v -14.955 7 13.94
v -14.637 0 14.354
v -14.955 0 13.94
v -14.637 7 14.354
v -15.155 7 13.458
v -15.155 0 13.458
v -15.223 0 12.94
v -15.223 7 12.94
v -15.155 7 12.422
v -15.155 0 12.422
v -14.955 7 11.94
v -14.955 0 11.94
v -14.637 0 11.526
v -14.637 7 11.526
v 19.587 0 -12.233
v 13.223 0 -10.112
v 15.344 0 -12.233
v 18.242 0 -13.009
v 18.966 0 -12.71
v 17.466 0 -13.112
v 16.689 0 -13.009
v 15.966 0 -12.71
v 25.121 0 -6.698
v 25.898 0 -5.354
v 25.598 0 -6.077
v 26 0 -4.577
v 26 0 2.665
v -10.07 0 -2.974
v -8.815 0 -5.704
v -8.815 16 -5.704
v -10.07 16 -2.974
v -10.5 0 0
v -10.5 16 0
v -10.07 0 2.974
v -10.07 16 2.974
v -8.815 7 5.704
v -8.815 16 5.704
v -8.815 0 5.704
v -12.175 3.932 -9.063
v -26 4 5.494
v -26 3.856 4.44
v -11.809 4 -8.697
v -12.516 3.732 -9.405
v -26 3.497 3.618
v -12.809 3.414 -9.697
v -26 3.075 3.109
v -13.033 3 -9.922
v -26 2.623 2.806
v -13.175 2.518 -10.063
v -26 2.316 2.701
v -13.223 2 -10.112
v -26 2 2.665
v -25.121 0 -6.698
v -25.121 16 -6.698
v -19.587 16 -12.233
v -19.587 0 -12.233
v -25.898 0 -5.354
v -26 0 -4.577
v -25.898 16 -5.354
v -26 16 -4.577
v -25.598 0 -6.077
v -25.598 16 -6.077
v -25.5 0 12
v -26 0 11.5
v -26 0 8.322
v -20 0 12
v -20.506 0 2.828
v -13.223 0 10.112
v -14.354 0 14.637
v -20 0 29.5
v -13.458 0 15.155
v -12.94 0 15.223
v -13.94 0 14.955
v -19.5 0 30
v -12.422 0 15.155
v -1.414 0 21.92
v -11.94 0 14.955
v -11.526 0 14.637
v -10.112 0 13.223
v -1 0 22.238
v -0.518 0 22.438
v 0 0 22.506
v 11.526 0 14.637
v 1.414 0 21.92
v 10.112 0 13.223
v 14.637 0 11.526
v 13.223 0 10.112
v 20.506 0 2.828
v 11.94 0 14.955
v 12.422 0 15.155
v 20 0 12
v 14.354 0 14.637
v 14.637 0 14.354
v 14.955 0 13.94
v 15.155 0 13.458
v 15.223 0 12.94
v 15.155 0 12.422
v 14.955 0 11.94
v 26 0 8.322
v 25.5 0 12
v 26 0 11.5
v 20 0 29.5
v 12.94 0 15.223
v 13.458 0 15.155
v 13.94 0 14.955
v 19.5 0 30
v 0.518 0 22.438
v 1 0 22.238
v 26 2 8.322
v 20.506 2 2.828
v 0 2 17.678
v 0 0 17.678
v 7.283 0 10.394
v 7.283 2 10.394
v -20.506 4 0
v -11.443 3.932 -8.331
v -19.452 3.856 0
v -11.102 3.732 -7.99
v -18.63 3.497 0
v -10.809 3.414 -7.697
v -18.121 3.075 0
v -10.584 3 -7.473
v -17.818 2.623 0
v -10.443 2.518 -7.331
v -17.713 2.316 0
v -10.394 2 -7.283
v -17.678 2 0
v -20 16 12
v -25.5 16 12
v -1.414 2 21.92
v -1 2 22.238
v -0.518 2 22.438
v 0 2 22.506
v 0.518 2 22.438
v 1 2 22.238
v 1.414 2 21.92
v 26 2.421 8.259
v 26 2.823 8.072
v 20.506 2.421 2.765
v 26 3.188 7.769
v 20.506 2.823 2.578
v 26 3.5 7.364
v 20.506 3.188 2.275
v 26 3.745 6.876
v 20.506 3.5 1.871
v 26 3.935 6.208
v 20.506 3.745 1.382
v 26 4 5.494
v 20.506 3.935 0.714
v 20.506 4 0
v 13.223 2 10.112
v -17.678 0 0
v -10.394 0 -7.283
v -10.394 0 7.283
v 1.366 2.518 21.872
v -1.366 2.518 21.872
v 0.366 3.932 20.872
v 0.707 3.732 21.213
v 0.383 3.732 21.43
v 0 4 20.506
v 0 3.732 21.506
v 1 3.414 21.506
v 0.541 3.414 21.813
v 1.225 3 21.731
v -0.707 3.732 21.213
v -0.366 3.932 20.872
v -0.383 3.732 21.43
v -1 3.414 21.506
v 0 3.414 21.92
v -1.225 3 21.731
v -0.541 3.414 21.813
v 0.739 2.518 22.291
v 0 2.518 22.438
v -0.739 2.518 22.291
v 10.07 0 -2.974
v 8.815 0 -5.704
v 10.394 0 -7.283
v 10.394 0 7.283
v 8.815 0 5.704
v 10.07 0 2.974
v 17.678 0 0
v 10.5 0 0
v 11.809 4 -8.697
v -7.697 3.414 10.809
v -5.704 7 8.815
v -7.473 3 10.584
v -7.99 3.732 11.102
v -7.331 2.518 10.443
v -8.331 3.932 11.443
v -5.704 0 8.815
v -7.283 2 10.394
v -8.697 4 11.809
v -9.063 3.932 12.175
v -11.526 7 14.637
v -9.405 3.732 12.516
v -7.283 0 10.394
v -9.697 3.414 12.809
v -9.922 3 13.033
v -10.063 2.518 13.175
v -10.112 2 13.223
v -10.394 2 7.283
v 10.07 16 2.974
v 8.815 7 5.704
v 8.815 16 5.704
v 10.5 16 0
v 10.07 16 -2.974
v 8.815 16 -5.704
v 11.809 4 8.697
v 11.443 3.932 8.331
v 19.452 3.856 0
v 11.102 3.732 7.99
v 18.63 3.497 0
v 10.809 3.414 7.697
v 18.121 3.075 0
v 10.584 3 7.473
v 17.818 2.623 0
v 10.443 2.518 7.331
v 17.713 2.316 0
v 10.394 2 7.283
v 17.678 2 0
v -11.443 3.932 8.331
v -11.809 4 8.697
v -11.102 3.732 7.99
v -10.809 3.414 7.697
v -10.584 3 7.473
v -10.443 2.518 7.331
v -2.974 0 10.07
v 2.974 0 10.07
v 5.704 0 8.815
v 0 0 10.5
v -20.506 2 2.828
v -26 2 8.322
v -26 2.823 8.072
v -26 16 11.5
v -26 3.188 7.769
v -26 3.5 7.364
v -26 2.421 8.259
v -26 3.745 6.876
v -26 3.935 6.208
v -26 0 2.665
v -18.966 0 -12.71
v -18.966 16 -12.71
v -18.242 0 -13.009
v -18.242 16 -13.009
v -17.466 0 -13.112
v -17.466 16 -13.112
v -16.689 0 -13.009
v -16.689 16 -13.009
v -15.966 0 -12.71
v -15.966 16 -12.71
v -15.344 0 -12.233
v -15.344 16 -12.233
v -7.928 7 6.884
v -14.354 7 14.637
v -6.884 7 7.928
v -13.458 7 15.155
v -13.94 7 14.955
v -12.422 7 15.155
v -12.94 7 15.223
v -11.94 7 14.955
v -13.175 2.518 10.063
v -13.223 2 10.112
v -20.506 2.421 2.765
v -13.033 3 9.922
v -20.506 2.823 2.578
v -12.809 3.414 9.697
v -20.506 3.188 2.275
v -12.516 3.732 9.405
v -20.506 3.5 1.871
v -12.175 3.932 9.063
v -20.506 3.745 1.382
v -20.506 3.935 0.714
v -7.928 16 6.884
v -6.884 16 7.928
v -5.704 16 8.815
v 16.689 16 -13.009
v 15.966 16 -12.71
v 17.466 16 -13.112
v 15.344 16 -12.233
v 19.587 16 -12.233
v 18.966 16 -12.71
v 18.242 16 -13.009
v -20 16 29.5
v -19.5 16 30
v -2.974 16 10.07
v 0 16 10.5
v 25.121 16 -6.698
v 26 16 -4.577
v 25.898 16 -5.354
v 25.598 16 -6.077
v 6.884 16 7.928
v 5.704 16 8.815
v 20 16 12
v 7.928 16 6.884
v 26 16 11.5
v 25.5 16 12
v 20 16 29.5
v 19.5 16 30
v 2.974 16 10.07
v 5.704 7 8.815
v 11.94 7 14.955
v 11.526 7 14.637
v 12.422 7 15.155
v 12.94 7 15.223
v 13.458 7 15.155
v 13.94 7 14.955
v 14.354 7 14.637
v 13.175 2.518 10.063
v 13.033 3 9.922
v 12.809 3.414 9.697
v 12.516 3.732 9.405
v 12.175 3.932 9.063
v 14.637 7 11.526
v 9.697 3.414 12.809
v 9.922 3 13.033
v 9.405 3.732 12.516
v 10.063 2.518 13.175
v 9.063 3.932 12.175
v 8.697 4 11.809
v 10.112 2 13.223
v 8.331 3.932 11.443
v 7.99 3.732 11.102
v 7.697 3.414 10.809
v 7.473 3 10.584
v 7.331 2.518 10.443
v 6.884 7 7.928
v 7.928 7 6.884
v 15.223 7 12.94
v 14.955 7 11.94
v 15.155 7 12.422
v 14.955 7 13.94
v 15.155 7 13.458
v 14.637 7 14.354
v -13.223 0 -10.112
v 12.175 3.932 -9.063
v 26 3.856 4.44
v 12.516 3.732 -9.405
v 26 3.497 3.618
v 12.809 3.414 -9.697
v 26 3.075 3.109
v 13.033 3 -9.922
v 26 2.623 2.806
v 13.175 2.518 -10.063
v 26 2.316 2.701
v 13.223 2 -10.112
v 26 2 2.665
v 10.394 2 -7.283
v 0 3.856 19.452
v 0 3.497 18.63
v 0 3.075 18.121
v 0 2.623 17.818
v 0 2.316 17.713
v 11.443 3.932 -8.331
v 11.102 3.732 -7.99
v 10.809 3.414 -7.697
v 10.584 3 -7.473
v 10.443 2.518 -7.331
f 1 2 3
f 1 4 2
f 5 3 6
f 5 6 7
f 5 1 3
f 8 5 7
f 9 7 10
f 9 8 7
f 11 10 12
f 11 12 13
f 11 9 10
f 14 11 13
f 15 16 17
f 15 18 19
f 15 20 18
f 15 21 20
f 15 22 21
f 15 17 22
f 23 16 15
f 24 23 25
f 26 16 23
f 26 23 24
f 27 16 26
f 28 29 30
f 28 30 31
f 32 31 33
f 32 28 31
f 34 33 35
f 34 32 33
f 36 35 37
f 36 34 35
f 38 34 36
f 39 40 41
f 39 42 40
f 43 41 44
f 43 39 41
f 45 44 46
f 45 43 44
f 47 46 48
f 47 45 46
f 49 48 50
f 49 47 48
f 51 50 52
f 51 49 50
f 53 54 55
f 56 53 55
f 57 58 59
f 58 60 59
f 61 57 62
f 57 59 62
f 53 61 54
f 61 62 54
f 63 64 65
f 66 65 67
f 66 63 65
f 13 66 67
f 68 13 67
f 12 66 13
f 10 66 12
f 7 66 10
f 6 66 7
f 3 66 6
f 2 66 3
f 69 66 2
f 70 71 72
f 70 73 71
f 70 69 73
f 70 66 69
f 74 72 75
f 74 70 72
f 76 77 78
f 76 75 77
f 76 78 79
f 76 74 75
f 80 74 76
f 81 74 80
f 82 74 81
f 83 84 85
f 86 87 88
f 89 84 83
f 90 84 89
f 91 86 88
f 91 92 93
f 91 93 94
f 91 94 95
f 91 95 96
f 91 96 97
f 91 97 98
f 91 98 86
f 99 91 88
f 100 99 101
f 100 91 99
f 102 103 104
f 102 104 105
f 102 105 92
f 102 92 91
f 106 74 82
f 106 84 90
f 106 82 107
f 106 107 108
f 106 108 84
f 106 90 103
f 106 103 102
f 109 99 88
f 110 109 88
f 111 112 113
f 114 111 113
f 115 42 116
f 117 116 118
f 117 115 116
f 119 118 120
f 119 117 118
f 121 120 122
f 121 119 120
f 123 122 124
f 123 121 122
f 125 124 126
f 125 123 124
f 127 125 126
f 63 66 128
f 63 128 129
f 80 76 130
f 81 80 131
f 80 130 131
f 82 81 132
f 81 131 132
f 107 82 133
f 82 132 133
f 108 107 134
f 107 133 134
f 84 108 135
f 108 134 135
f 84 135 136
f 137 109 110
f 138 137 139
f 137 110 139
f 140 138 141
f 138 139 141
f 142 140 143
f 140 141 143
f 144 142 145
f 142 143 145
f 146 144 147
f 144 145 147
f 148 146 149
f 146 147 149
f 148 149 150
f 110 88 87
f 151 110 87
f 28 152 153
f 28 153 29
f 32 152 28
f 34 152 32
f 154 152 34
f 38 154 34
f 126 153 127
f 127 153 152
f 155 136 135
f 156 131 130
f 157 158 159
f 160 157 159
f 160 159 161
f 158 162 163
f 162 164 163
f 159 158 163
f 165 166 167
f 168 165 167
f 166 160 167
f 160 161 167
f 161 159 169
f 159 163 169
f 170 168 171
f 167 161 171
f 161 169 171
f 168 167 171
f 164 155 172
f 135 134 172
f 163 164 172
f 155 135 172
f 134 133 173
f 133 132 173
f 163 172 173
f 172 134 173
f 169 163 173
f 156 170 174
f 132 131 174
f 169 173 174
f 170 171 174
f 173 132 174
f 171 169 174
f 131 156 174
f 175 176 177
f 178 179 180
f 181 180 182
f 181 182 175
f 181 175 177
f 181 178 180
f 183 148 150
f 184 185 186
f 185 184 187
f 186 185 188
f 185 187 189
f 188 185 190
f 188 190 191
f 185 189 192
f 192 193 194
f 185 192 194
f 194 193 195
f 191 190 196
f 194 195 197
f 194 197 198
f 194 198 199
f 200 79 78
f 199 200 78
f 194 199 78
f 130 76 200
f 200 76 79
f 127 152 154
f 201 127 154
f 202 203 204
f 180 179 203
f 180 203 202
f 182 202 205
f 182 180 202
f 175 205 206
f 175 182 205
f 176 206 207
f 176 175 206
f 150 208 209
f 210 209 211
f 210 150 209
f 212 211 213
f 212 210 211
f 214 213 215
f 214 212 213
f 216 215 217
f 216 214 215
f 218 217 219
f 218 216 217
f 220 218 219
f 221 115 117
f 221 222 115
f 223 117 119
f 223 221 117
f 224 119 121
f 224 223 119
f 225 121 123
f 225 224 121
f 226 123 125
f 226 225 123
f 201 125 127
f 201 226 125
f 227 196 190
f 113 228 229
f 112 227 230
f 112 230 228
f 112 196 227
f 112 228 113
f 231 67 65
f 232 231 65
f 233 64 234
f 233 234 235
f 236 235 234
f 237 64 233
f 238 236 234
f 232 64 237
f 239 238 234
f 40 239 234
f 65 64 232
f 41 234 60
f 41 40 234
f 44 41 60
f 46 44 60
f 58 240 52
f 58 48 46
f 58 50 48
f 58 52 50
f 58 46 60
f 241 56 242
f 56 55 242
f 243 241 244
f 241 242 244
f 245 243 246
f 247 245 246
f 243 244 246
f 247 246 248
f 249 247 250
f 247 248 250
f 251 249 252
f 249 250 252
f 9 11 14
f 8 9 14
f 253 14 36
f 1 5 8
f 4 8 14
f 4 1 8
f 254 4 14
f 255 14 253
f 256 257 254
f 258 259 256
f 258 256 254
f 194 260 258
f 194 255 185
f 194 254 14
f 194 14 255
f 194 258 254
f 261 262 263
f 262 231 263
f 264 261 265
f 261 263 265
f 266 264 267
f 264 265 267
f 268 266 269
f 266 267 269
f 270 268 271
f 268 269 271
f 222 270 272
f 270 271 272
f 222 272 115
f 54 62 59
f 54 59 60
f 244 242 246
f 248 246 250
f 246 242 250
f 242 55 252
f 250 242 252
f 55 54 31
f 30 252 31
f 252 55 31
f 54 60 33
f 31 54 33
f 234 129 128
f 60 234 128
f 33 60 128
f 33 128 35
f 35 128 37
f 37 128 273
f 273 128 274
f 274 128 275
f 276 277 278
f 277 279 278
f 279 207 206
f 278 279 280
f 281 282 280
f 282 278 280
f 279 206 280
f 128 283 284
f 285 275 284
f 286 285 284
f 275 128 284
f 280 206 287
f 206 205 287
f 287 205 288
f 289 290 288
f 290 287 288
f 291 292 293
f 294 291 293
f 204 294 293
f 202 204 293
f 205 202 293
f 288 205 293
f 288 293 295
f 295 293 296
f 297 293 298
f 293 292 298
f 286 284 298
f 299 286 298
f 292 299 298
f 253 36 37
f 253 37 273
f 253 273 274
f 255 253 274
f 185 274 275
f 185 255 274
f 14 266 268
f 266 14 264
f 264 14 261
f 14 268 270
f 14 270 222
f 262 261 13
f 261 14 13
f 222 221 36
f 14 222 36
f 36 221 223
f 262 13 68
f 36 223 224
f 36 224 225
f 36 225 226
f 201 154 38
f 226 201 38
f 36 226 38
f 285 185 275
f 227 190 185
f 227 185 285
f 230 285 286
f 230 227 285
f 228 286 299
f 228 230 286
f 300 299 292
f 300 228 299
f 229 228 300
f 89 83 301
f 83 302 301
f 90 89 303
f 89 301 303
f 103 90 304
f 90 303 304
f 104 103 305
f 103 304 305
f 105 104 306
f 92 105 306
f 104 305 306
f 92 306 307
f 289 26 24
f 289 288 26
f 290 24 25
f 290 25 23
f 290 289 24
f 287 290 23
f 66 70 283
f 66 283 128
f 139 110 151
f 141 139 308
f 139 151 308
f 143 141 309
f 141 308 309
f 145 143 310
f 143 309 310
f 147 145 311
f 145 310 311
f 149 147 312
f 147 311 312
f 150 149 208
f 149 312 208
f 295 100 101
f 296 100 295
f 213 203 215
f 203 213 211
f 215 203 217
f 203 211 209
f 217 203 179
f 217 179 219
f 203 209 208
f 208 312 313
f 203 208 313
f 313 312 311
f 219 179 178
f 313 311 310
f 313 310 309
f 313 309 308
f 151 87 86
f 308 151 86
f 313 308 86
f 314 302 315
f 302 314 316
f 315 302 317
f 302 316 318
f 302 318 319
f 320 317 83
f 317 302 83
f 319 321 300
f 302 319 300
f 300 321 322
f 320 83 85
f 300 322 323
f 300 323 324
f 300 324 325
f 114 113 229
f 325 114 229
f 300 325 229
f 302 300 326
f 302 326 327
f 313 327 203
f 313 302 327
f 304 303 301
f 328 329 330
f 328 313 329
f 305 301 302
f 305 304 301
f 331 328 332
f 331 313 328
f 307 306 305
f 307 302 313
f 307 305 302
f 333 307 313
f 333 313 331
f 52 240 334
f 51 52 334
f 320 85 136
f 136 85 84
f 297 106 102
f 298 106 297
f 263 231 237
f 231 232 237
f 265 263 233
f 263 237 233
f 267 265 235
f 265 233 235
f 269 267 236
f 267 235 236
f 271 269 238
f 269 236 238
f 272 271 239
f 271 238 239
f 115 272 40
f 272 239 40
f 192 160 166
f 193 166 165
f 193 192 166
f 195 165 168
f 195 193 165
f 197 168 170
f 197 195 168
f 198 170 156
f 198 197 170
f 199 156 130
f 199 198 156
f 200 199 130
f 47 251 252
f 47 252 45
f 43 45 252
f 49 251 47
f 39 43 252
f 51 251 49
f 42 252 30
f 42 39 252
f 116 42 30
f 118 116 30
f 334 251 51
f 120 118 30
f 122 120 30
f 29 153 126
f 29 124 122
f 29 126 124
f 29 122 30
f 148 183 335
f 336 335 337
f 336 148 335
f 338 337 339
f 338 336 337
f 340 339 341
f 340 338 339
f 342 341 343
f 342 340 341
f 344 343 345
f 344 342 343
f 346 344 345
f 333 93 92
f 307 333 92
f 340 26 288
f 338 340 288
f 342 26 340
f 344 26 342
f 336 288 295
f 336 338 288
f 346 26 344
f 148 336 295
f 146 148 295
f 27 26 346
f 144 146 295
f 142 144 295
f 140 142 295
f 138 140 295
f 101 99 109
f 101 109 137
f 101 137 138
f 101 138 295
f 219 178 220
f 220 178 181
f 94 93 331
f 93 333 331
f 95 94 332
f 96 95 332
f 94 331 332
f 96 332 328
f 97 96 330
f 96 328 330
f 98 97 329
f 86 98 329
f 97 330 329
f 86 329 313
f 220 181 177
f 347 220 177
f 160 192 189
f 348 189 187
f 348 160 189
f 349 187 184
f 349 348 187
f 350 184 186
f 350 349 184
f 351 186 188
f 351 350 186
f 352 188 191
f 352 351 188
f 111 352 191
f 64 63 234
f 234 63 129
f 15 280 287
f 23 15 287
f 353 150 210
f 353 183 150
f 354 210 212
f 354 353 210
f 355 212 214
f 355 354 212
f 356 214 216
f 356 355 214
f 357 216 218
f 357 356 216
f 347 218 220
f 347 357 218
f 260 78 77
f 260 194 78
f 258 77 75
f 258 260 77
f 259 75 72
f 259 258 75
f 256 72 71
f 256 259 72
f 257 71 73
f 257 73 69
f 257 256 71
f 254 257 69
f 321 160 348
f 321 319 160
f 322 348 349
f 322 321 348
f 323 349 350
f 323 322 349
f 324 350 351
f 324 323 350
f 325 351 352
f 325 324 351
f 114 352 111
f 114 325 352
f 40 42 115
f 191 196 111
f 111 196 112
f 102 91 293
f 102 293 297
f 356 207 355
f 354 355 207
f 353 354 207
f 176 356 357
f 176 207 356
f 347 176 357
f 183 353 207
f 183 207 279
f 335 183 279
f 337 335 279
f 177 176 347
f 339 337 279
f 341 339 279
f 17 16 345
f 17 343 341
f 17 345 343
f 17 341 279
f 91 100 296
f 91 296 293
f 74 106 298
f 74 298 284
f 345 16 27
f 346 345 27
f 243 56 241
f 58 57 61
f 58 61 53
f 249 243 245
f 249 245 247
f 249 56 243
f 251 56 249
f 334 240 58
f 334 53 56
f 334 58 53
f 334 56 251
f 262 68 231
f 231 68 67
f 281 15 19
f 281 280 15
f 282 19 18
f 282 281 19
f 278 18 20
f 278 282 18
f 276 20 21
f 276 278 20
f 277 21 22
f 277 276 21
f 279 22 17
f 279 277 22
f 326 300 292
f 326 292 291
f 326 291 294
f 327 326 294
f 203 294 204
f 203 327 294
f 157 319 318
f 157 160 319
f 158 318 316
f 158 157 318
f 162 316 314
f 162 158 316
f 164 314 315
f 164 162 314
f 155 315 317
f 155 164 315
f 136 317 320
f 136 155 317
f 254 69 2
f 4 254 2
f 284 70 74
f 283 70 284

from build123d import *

# Parameters (mm, degrees)
F1_DEPTH = 16
F2_DEPTH = 7
F3_DEPTH = 4
F4_R     = 2
F5_R     = 1.9999
F6_R     = 3
F7_SIZE  = 0.5


# Not quite as in the source:
# - a fillet or chamfer is up to 0.001 mm smaller than in the source, because OpenCascade refuses the exact size
# - a feature names something its author has since deleted; it is built from what else it names


with BuildPart() as f1:
    # F0 (on Front) → F1 (new body)
    with BuildSketch(Plane.XZ):
        with BuildLine():
            ThreePointArc((-5.7041860158, 8.815455853), (0, 10.5), (5.7041860158, 8.815455853))
            Line((5.7041860158, 8.815455853), (7.2831998462, 10.3944696834))
            Line((7.2831998462, 10.3944696834), (0, 17.6776695297))
            Line((0, 17.6776695297), (-7.2831998462, 10.3944696834))
            Line((-7.2831998462, 10.3944696834), (-5.7041860158, 8.815455853))
        make_face()
        with BuildLine():
            ThreePointArc((-8.815455853, 5.7041860158), (-7.4246212025, 7.4246212025), (-5.7041860158, 8.815455853))
            Line((-5.7041860158, 8.815455853), (-7.2831998462, 10.3944696834))
            Line((-7.2831998462, 10.3944696834), (-10.3944696834, 7.2831998462))
            Line((-10.3944696834, 7.2831998462), (-8.815455853, 5.7041860158))
        make_face()
        with BuildLine():
            ThreePointArc((-8.815455853, -5.7041860158), (-10.5, 0), (-8.815455853, 5.7041860158))
            Line((-8.815455853, 5.7041860158), (-10.3944696834, 7.2831998462))
            Line((-10.3944696834, 7.2831998462), (-17.6776695297, 0))
            Line((-17.6776695297, 0), (-10.3944696834, -7.2831998462))
            Line((-10.3944696834, -7.2831998462), (-8.815455853, -5.7041860158))
        make_face()
        with BuildLine():
            ThreePointArc((5.7041860158, 8.815455853), (7.4246212025, 7.4246212025), (8.815455853, 5.7041860158))
            Line((8.815455853, 5.7041860158), (10.3944696834, 7.2831998462))
            Line((10.3944696834, 7.2831998462), (7.2831998462, 10.3944696834))
            Line((7.2831998462, 10.3944696834), (5.7041860158, 8.815455853))
        make_face()
        Polygon((0, 17.6776695297), (7.2831998462, 10.3944696834), (10.111626971, 13.2228968082), (0, 23.3345237792), (-10.111626971, 13.2228968082), (-7.2831998462, 10.3944696834), align=None)
        Polygon((7.2831998462, 10.3944696834), (10.3944696834, 7.2831998462), (13.2228968082, 10.111626971), (10.111626971, 13.2228968082), align=None)
        Polygon((-10.3944696834, 7.2831998462), (-7.2831998462, 10.3944696834), (-10.111626971, 13.2228968082), (-13.2228968082, 10.111626971), align=None)
        Polygon((-17.6776695297, 0), (-10.3944696834, 7.2831998462), (-13.2228968082, 10.111626971), (-20.5060966544, 2.8284271247), (-26, 8.3223304703), (-26, 2.6654762208), (-13.2228968082, -10.111626971), (-10.3944696834, -7.2831998462), align=None)
        Polygon((-13.2228968082, 10.111626971), (-10.111626971, 13.2228968082), (-12.9400540957, 16.0513239329), (-16.0513239329, 12.9400540957), align=None)
        Polygon((17.6776695297, 0), (10.3944696834, -7.2831998462), (13.2228968082, -10.111626971), (26, 2.6654762208), (26, 8.3223304703), (20.5060966544, 2.8284271247), (13.2228968082, 10.111626971), (10.3944696834, 7.2831998462), align=None)
        with BuildLine():
            ThreePointArc((8.815455853, 5.7041860158), (10.5, 0), (8.815455853, -5.7041860158))
            Line((8.815455853, -5.7041860158), (10.3944696834, -7.2831998462))
            Line((10.3944696834, -7.2831998462), (17.6776695297, 0))
            Line((17.6776695297, 0), (10.3944696834, 7.2831998462))
            Line((10.3944696834, 7.2831998462), (8.815455853, 5.7041860158))
        make_face()
        Polygon((16.0513239329, 12.9400540957), (13.2228968082, 10.111626971), (20.5060966544, 2.8284271247), (26, 8.3223304703), (26, 12), (20, 12), (20, 30), (0, 30), (-20, 30), (-20, 12), (-26, 12), (-26, 8.3223304703), (-20.5060966544, 2.8284271247), (-13.2228968082, 10.111626971), (-16.0513239329, 12.9400540957), (-12.9400540957, 16.0513239329), (-10.111626971, 13.2228968082), (0, 23.3345237792), (10.111626971, 13.2228968082), (12.9400540957, 16.0513239329), align=None)
        Polygon((10.111626971, 13.2228968082), (13.2228968082, 10.111626971), (16.0513239329, 12.9400540957), (12.9400540957, 16.0513239329), align=None)
        Polygon((26, 2.6654762208), (13.2228968082, -10.111626971), (17.4655374953, -14.3542676581), (26, -5.8198051534), align=None)
        Polygon((-17.4655374953, -14.3542676581), (-13.2228968082, -10.111626971), (-26, 2.6654762208), (-26, -5.8198051534), align=None)
    extrude(amount=-F1_DEPTH)

    # F0 (on Front) → F2 (cut)
    with BuildSketch(Plane.XZ):
        Polygon((10.111626971, 13.2228968082), (13.2228968082, 10.111626971), (16.0513239329, 12.9400540957), (12.9400540957, 16.0513239329), align=None)
        Polygon((7.2831998462, 10.3944696834), (10.3944696834, 7.2831998462), (13.2228968082, 10.111626971), (10.111626971, 13.2228968082), align=None)
        with BuildLine():
            ThreePointArc((5.7041860158, 8.815455853), (7.4246212025, 7.4246212025), (8.815455853, 5.7041860158))
            Line((8.815455853, 5.7041860158), (10.3944696834, 7.2831998462))
            Line((10.3944696834, 7.2831998462), (7.2831998462, 10.3944696834))
            Line((7.2831998462, 10.3944696834), (5.7041860158, 8.815455853))
        make_face()
        with BuildLine():
            ThreePointArc((-8.815455853, 5.7041860158), (-7.4246212025, 7.4246212025), (-5.7041860158, 8.815455853))
            Line((-5.7041860158, 8.815455853), (-7.2831998462, 10.3944696834))
            Line((-7.2831998462, 10.3944696834), (-10.3944696834, 7.2831998462))
            Line((-10.3944696834, 7.2831998462), (-8.815455853, 5.7041860158))
        make_face()
        Polygon((-13.2228968082, 10.111626971), (-10.111626971, 13.2228968082), (-12.9400540957, 16.0513239329), (-16.0513239329, 12.9400540957), align=None)
        Polygon((-10.3944696834, 7.2831998462), (-7.2831998462, 10.3944696834), (-10.111626971, 13.2228968082), (-13.2228968082, 10.111626971), align=None)
    extrude(amount=-F2_DEPTH, mode=Mode.SUBTRACT)

    # F0 (on Front) → F3 (cut)
    with BuildSketch(Plane.XZ):
        Polygon((0, 17.6776695297), (7.2831998462, 10.3944696834), (10.111626971, 13.2228968082), (0, 23.3345237792), (-10.111626971, 13.2228968082), (-7.2831998462, 10.3944696834), align=None)
        Polygon((17.6776695297, 0), (10.3944696834, -7.2831998462), (13.2228968082, -10.111626971), (26, 2.6654762208), (26, 8.3223304703), (20.5060966544, 2.8284271247), (13.2228968082, 10.111626971), (10.3944696834, 7.2831998462), align=None)
        Polygon((-17.6776695297, 0), (-10.3944696834, 7.2831998462), (-13.2228968082, 10.111626971), (-20.5060966544, 2.8284271247), (-26, 8.3223304703), (-26, 2.6654762208), (-13.2228968082, -10.111626971), (-10.3944696834, -7.2831998462), align=None)
    extrude(amount=-F3_DEPTH, mode=Mode.SUBTRACT)

    # F4
    f4_edges = [f1.edges().sort_by_distance(p)[0] for p in [
        (-16.051324, 3.5, 12.940054),
        (-12.940054, 3.5, 16.051324),
        (12.940054, 3.5, 16.051324),
        (16.051324, 3.5, 12.940054),
        (0, 2, 23.334524),
    ]]
    fillet(f4_edges, radius=F4_R)

    # F5 (radius 2 in the source; OpenCascade refuses exactly that, so slightly less here)
    f5_edges = [f1.edges().sort_by_distance(p)[0] for p in [
        (19.611448, 4, -3.723075),
        (14.03607, 4, -3.6416),
        (14.03607, 4, 3.6416),
        (16.864497, 4, 6.470027),
        (5.76292, 4, 17.571604),
        (-16.864497, 4, 6.470027),
        (-23.253048, 4, 5.575379),
        (-14.03607, 4, -3.6416),
        (-3.6416, 4, 14.03607),
        (-14.03607, 4, 3.6416),
        (-19.611448, 4, -3.723075),
        (23.253048, 4, 5.575379),
        (0, 4, 22.506097),
        (-5.76292, 4, 17.571604),
        (3.6416, 4, 14.03607),
    ]]
    fillet(f5_edges, radius=F5_R)

    # F6
    f6_edges = [f1.edges().sort_by_distance(p)[0] for p in [
        (17.465537, 8, -14.354268),
        (26, 8, -5.819805),
        (-26, 8, -5.819805),
        (-17.465537, 8, -14.354268),
    ]]
    fillet(f6_edges, radius=F6_R)

    # F7
    f7_edges = [f1.edges().sort_by_distance(p)[0] for p in [
        (20, 8, 30),
        (26, 8, 12),
        (-20, 8, 30),
        (-26, 8, 12),
    ]]
    chamfer(f7_edges, length=F7_SIZE)


solid = f1.part
